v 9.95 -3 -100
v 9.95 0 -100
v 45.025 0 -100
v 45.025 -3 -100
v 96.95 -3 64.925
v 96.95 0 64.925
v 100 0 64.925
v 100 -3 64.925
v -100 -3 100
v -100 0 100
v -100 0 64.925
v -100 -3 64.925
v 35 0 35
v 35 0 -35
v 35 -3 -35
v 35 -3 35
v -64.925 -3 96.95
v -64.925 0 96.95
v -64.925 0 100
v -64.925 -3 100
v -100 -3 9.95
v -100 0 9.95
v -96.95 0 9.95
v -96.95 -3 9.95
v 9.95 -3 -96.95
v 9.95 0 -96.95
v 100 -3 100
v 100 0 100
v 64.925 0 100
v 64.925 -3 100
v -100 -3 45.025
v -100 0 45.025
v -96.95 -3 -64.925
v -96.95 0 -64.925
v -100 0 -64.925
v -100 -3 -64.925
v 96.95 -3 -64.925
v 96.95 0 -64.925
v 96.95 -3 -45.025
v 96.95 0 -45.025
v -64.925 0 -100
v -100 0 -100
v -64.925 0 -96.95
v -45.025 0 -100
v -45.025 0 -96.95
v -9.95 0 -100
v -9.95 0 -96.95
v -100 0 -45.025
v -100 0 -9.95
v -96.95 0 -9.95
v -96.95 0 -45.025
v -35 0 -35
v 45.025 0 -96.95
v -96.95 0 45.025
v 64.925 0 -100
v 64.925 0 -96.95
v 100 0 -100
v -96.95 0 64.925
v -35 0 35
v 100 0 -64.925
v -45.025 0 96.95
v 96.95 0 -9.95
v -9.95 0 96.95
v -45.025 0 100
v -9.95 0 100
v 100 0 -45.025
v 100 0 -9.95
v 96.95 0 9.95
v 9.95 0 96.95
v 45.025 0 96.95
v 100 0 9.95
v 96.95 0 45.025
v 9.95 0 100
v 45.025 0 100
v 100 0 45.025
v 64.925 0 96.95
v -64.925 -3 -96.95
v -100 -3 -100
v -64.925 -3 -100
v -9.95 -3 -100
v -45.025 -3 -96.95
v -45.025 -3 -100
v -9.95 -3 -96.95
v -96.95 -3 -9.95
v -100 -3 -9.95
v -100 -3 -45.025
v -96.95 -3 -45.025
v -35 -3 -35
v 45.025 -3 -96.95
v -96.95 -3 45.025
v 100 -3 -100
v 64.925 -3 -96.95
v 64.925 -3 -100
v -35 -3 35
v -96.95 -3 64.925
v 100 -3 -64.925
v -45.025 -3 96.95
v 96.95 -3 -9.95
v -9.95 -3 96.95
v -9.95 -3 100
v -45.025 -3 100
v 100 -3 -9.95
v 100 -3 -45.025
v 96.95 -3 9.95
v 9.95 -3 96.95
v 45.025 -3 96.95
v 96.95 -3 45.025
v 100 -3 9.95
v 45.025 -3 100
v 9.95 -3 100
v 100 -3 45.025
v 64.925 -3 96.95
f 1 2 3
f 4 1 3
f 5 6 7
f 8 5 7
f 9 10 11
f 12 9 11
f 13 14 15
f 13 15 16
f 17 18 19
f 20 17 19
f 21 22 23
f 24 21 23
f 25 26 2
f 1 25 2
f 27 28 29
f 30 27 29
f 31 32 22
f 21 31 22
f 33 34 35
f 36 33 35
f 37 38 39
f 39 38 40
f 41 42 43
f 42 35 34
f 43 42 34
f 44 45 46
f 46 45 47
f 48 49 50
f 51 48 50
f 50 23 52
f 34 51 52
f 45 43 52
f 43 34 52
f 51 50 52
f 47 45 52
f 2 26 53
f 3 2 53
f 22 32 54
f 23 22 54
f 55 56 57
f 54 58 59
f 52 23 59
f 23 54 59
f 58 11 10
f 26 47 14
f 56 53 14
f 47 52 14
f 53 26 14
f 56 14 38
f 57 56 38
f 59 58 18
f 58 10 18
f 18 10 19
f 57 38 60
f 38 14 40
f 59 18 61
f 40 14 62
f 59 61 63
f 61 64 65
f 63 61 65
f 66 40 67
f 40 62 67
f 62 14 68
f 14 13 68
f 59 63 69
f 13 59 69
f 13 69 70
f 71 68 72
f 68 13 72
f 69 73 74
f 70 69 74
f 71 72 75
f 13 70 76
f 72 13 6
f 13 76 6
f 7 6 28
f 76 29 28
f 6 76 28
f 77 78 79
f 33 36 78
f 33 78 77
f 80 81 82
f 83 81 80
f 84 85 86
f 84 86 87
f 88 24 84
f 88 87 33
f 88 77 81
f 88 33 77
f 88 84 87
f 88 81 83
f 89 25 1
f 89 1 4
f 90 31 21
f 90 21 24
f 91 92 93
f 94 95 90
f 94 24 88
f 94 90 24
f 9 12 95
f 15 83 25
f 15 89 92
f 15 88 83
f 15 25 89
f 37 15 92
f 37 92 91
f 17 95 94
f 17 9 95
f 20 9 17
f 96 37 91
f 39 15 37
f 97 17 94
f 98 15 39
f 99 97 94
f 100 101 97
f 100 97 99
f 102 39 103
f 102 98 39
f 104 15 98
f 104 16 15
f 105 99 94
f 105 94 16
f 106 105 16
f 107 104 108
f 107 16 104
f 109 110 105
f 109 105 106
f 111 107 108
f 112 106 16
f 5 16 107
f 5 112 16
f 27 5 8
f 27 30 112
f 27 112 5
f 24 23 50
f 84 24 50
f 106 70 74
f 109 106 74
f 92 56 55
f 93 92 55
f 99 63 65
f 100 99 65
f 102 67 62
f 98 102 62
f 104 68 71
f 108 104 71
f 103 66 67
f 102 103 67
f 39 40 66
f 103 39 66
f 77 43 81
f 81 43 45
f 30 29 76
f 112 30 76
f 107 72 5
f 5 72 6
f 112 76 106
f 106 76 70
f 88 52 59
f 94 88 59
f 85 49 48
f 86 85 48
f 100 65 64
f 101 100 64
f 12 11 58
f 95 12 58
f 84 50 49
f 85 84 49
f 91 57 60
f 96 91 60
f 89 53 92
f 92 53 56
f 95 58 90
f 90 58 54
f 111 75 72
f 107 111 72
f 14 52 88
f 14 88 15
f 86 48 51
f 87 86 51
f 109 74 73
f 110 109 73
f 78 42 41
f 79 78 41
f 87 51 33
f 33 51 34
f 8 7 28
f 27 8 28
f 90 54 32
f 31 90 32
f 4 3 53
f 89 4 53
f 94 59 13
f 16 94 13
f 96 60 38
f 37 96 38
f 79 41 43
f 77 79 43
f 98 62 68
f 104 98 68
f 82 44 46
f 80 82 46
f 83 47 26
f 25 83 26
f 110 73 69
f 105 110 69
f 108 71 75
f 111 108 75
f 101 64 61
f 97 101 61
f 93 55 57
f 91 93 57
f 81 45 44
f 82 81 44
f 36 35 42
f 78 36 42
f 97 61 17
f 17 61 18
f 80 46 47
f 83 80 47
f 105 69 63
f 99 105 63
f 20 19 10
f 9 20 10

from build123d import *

# Parameters (mm, degrees)
F0_W     = 70
F0_H     = 70
F1_DEPTH = 3


with BuildPart() as f1:
    # F0 (on Front) → F1 (new body)
    with BuildSketch(Plane.XZ):
        Polygon((64.925, -100), (100, -100), (100, -64.925), (96.95, -64.925), (96.95, -45.025), (100, -45.025), (100, -9.95), (96.95, -9.95), (96.95, 9.95), (100, 9.95), (100, 45.025), (96.95, 45.025), (96.95, 64.925), (100, 64.925), (100, 100), (64.925, 100), (64.925, 96.95), (45.025, 96.95), (45.025, 100), (9.95, 100), (9.95, 96.95), (-9.95, 96.95), (-9.95, 100), (-45.025, 100), (-45.025, 96.95), (-64.925, 96.95), (-64.925, 100), (-100, 100), (-100, 64.925), (-96.95, 64.925), (-96.95, 45.025), (-100, 45.025), (-100, 9.95), (-96.95, 9.95), (-96.95, -9.95), (-100, -9.95), (-100, -45.025), (-96.95, -45.025), (-96.95, -64.925), (-100, -64.925), (-100, -100), (-64.925, -100), (-64.925, -96.95), (-45.025, -96.95), (-45.025, -100), (-9.95, -100), (-9.95, -96.95), (9.95, -96.95), (9.95, -100), (45.025, -100), (45.025, -96.95), (64.925, -96.95), align=None)
        Rectangle(F0_W, F0_H, mode=Mode.SUBTRACT)
    extrude(amount=F1_DEPTH)


solid = f1.part
